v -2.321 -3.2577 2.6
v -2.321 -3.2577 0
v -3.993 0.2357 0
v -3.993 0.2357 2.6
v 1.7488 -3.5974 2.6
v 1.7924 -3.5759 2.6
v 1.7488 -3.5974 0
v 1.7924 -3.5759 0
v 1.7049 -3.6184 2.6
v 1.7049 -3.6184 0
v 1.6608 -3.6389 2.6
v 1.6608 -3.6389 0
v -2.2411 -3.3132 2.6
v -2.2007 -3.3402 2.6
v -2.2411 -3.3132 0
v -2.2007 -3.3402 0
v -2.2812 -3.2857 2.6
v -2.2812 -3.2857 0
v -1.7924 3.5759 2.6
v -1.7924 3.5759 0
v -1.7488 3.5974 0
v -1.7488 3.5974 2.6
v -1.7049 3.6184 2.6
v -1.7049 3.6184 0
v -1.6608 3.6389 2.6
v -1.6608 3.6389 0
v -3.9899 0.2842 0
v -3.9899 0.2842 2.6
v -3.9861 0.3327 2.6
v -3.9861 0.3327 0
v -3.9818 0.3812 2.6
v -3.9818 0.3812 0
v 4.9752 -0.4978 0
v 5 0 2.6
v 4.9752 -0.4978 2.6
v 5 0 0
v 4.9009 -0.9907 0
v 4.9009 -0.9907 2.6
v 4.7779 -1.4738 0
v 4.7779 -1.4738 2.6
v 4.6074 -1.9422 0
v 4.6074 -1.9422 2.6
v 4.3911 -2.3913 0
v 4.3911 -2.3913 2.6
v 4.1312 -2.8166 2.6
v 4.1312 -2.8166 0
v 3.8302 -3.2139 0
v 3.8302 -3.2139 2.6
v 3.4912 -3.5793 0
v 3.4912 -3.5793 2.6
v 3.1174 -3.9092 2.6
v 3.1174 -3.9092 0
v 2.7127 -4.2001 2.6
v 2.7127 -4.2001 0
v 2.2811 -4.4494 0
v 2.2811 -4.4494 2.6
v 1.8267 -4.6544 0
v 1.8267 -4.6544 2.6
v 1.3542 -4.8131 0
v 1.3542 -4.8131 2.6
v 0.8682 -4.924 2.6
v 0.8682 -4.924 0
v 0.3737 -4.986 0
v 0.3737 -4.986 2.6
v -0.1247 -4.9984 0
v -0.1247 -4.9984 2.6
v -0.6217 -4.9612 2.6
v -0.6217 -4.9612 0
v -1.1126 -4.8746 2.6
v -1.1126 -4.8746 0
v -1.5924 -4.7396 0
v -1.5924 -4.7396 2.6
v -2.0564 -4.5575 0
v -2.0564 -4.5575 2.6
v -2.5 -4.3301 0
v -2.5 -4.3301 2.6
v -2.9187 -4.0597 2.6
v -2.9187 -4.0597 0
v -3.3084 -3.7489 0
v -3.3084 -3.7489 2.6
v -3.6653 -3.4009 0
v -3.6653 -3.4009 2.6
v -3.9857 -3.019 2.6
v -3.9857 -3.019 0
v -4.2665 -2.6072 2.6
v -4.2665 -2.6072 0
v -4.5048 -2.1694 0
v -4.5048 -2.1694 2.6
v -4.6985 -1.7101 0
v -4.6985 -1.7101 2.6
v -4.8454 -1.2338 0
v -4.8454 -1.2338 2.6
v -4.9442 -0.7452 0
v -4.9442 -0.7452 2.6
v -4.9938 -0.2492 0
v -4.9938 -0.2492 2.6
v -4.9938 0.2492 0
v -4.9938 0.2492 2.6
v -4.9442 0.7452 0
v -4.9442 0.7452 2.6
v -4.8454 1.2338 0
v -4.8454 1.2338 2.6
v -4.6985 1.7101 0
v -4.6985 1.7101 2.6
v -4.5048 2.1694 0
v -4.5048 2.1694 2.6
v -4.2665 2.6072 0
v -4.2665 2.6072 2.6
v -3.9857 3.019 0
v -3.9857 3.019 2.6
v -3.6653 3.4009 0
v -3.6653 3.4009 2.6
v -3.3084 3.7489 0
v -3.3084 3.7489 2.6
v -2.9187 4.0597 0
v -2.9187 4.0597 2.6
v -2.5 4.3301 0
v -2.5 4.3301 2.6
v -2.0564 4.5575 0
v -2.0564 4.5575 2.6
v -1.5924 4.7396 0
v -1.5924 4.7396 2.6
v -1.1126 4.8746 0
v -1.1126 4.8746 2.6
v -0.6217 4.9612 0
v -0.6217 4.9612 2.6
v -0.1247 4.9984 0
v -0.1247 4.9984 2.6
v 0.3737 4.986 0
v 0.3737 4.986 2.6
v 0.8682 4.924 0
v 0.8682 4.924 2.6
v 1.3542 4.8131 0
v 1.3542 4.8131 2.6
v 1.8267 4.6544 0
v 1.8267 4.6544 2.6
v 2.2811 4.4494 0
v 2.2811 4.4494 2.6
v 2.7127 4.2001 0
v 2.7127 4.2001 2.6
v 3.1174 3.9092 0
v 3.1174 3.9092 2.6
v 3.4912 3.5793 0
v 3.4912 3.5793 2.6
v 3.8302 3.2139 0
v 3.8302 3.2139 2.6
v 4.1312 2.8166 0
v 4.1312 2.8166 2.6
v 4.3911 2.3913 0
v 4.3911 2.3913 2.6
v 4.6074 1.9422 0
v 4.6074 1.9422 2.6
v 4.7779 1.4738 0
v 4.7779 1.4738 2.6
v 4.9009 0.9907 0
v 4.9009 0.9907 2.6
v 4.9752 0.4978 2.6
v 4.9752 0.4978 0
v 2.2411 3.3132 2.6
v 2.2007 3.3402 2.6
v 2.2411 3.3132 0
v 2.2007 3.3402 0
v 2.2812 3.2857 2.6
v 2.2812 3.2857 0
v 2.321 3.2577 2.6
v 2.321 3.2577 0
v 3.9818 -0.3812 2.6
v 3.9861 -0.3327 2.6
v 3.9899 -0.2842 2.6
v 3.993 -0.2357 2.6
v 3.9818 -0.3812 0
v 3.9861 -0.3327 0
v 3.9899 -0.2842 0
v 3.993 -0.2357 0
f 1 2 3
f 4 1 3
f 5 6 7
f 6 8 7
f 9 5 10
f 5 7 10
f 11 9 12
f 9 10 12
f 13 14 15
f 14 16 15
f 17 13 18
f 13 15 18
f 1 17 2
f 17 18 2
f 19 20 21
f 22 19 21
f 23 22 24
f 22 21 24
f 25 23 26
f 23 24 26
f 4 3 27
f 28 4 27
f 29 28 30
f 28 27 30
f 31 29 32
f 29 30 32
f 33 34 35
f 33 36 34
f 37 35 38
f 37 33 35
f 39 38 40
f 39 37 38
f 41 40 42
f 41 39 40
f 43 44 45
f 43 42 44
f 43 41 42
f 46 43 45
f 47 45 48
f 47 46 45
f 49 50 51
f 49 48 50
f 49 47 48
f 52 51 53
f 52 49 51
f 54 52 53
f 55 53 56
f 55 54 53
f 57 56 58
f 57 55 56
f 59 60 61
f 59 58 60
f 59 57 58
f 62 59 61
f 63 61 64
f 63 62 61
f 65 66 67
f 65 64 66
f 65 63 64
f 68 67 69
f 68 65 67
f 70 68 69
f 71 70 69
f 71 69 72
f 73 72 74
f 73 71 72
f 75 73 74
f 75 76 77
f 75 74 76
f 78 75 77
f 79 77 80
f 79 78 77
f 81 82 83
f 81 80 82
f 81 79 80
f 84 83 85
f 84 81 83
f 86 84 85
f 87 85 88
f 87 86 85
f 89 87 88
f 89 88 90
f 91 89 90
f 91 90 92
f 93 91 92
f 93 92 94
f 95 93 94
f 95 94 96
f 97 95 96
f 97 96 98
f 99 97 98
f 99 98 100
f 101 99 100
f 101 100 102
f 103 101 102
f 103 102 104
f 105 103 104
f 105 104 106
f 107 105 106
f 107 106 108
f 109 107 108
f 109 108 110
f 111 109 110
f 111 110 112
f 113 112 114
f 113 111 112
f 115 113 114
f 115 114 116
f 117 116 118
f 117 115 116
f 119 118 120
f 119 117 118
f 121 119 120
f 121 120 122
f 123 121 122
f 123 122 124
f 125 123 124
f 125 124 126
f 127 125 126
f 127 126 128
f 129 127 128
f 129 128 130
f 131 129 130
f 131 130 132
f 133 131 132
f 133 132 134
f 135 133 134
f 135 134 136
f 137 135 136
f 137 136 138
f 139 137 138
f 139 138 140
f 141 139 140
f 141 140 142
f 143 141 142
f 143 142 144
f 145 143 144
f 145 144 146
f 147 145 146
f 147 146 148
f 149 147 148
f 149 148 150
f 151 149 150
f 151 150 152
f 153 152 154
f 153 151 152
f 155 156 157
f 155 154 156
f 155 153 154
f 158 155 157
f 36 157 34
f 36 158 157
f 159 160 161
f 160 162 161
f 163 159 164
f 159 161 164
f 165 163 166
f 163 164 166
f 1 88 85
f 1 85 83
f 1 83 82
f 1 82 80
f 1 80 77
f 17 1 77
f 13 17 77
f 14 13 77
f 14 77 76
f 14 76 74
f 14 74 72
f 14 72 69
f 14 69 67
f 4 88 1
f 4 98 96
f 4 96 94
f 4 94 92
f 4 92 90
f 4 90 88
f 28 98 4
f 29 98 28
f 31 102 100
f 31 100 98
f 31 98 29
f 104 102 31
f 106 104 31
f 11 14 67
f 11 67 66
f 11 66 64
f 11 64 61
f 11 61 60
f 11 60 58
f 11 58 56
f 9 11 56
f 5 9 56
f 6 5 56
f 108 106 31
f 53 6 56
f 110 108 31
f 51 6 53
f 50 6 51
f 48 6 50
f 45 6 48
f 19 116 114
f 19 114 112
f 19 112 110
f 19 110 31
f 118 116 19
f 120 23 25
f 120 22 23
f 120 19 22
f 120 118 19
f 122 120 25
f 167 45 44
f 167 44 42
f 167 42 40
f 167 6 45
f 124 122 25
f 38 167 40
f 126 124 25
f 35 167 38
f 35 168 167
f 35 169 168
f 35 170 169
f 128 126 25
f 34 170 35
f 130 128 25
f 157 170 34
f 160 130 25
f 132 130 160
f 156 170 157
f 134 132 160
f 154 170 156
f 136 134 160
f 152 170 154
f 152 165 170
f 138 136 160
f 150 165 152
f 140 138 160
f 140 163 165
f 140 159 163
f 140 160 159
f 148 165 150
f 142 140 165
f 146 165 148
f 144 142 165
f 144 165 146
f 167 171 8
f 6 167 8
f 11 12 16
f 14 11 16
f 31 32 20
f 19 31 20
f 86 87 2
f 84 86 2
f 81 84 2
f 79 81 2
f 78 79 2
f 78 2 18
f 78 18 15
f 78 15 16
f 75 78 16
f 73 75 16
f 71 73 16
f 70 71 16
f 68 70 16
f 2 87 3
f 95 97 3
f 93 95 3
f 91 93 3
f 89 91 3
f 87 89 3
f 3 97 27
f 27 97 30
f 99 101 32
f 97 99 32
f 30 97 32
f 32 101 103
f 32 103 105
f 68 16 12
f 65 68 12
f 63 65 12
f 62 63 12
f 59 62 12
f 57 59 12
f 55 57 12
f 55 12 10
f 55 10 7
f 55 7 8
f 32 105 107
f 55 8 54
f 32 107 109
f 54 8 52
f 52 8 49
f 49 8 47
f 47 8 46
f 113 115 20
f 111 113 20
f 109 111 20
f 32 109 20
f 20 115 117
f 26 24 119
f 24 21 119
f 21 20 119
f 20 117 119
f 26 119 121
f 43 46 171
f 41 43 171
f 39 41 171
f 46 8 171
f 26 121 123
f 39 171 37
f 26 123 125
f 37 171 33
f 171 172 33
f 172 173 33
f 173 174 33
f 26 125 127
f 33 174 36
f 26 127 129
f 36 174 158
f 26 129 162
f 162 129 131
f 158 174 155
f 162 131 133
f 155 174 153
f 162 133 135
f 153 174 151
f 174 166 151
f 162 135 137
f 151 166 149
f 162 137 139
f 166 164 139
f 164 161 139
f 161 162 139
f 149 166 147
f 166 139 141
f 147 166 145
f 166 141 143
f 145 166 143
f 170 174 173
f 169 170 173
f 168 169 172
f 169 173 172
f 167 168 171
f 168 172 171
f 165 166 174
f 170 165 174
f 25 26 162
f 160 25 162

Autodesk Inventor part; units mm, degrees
ref_plane "YZ Plane" through (0, 0, 0) normal (1, 0, 0) x (0, 1, 0)
ref_plane "XZ Plane" through (0, 0, 0) normal (0, 1, 0) x (-1, 0, 0)
sketch "Sketch1" plane through (0, 0, 0) normal (0, 0, 1) x (1, 0, 0)
  line L0 (3.9818, -0.3812) -> (1.7924, -3.5759)
  arc A0 (1.6608, -3.6389) -> (1.7924, -3.5759) centre (0, 0) ccw
  line L1 (1.6608, -3.6389) -> (-2.2007, -3.3402)
  arc A1 (-2.321, -3.2577) -> (-2.2007, -3.3402) centre (0, 0) ccw
  line L2 (-2.321, -3.2577) -> (-3.993, 0.2357)
  arc A2 (-3.9818, 0.3812) -> (-3.993, 0.2357) centre (0, 0) ccw
  line L3 (-3.9818, 0.3812) -> (-1.7924, 3.5759)
  arc A3 (-1.6608, 3.6389) -> (-1.7924, 3.5759) centre (0, 0) ccw
  line L4 (-1.6608, 3.6389) -> (2.2007, 3.3402)
  arc A4 (2.321, 3.2577) -> (2.2007, 3.3402) centre (0, 0) ccw
  line L5 (2.321, 3.2577) -> (3.993, -0.2357)
  arc A5 (3.9818, -0.3812) -> (3.993, -0.2357) centre (0, 0) ccw
  circle A6 centre (0, 0) radius 5
  point P0 (0, 0)
  dimension "d0" = 10
ref_plane "Work Plane1" through (-9.2786, -9.2786, 2.6) normal (0, 0, -1) x (0, 1, 0)
extrude "Extrusion1" add sketch "Sketch1" along normal up to surface (2.6 mm away)
properties part number "Power_Transmission_Spacer_One"
